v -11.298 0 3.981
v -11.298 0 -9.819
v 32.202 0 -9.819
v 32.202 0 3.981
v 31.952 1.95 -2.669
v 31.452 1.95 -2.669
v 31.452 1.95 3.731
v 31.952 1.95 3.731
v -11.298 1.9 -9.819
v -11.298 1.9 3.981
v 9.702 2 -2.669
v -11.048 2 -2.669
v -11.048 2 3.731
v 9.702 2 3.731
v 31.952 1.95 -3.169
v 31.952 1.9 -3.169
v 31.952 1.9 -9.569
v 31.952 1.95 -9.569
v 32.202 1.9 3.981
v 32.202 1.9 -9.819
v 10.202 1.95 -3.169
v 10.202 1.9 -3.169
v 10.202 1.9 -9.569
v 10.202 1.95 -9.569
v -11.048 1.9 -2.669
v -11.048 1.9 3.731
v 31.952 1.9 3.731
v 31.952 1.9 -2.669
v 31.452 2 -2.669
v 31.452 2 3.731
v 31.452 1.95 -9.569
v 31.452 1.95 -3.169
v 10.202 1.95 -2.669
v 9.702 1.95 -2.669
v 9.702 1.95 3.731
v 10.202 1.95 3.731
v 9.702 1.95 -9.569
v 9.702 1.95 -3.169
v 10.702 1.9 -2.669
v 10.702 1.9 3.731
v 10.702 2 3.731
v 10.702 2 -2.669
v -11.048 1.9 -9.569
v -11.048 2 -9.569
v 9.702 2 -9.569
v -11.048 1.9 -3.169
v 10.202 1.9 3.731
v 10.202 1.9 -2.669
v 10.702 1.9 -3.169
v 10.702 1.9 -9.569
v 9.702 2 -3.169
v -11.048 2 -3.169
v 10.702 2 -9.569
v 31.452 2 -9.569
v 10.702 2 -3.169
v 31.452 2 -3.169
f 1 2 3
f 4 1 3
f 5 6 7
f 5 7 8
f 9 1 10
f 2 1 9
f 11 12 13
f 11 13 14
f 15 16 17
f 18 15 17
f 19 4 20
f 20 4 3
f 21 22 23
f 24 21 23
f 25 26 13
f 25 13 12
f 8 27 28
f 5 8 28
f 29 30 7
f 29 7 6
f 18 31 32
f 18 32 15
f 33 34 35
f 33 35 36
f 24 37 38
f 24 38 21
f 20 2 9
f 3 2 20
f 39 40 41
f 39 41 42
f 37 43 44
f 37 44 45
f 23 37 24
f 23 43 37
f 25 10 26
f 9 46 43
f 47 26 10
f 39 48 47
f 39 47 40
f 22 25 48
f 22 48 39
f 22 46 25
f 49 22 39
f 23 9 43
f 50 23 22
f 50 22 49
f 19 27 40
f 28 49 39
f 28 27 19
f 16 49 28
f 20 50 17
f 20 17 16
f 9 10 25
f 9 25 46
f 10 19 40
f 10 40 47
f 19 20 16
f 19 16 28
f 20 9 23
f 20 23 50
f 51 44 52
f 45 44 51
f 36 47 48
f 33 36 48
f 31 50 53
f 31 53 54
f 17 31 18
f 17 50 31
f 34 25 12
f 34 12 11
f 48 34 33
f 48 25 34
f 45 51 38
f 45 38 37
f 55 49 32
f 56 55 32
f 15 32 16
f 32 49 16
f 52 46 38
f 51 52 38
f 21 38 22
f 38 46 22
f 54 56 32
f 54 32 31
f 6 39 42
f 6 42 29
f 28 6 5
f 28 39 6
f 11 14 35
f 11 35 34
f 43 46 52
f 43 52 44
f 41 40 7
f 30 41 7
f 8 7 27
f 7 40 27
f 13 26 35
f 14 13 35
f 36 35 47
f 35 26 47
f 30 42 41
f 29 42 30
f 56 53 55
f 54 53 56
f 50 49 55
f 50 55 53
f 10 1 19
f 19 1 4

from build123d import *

# Parameters (mm, degrees)
SKETCH1_W           = 43.5
SKETCH1_H           = 13.8
BOSS_EXTRUDE1_DEPTH = 1.9
SKETCH2_W           = 21.25
SKETCH2_H           = 6.4
BOSS_EXTRUDE2_DEPTH = 0.1
SKETCH10_W          = 0.5
SKETCH10_H          = 6.4
CUT_EXTRUDE1_DEPTH  = 0.05


with BuildPart() as part:
    # Sketch1 → Boss-Extrude1 (new body)
    with BuildSketch(Plane(origin=(0, 0, 0), x_dir=(1, 0, 0), z_dir=(0, 1, 0))):
        with Locations((10.452197802, 2.919230769)):
            Rectangle(SKETCH1_W, SKETCH1_H)
    extrude(amount=BOSS_EXTRUDE1_DEPTH)

    # Sketch2 → Boss-Extrude2 (add)
    with BuildSketch(Plane(origin=(0, 1.9, 0), x_dir=(1, 0, 0), z_dir=(0, 1, 0))):
        with Locations((-0.422802198, -0.530769231)):
            Rectangle(SKETCH2_W, SKETCH2_H)
        with Locations((-0.422802198, 6.369230769)):
            Rectangle(SKETCH2_W, SKETCH2_H)
        with Locations((21.327197802, 6.369230769)):
            Rectangle(SKETCH2_W, SKETCH2_H)
        with Locations((21.327197802, -0.530769231)):
            Rectangle(SKETCH2_W, SKETCH2_H)
    extrude(amount=BOSS_EXTRUDE2_DEPTH)

    # Sketch10 → Cut-Extrude1 (cut)
    with BuildSketch(Plane(origin=(0, 2, 0), x_dir=(1, 0, 0), z_dir=(0, 1, 0))):
        with Locations((9.952197802, -0.530769231)):
            Rectangle(SKETCH10_W, SKETCH10_H)
        with Locations((31.702197802, -0.530769231)):
            Rectangle(SKETCH10_W, SKETCH10_H)
        with Locations((9.952197802, 6.369230769)):
            Rectangle(SKETCH10_W, SKETCH10_H)
        with Locations((31.702197802, 6.369230769)):
            Rectangle(SKETCH10_W, SKETCH10_H)
    extrude(amount=-CUT_EXTRUDE1_DEPTH, mode=Mode.SUBTRACT)


solid = part.part
